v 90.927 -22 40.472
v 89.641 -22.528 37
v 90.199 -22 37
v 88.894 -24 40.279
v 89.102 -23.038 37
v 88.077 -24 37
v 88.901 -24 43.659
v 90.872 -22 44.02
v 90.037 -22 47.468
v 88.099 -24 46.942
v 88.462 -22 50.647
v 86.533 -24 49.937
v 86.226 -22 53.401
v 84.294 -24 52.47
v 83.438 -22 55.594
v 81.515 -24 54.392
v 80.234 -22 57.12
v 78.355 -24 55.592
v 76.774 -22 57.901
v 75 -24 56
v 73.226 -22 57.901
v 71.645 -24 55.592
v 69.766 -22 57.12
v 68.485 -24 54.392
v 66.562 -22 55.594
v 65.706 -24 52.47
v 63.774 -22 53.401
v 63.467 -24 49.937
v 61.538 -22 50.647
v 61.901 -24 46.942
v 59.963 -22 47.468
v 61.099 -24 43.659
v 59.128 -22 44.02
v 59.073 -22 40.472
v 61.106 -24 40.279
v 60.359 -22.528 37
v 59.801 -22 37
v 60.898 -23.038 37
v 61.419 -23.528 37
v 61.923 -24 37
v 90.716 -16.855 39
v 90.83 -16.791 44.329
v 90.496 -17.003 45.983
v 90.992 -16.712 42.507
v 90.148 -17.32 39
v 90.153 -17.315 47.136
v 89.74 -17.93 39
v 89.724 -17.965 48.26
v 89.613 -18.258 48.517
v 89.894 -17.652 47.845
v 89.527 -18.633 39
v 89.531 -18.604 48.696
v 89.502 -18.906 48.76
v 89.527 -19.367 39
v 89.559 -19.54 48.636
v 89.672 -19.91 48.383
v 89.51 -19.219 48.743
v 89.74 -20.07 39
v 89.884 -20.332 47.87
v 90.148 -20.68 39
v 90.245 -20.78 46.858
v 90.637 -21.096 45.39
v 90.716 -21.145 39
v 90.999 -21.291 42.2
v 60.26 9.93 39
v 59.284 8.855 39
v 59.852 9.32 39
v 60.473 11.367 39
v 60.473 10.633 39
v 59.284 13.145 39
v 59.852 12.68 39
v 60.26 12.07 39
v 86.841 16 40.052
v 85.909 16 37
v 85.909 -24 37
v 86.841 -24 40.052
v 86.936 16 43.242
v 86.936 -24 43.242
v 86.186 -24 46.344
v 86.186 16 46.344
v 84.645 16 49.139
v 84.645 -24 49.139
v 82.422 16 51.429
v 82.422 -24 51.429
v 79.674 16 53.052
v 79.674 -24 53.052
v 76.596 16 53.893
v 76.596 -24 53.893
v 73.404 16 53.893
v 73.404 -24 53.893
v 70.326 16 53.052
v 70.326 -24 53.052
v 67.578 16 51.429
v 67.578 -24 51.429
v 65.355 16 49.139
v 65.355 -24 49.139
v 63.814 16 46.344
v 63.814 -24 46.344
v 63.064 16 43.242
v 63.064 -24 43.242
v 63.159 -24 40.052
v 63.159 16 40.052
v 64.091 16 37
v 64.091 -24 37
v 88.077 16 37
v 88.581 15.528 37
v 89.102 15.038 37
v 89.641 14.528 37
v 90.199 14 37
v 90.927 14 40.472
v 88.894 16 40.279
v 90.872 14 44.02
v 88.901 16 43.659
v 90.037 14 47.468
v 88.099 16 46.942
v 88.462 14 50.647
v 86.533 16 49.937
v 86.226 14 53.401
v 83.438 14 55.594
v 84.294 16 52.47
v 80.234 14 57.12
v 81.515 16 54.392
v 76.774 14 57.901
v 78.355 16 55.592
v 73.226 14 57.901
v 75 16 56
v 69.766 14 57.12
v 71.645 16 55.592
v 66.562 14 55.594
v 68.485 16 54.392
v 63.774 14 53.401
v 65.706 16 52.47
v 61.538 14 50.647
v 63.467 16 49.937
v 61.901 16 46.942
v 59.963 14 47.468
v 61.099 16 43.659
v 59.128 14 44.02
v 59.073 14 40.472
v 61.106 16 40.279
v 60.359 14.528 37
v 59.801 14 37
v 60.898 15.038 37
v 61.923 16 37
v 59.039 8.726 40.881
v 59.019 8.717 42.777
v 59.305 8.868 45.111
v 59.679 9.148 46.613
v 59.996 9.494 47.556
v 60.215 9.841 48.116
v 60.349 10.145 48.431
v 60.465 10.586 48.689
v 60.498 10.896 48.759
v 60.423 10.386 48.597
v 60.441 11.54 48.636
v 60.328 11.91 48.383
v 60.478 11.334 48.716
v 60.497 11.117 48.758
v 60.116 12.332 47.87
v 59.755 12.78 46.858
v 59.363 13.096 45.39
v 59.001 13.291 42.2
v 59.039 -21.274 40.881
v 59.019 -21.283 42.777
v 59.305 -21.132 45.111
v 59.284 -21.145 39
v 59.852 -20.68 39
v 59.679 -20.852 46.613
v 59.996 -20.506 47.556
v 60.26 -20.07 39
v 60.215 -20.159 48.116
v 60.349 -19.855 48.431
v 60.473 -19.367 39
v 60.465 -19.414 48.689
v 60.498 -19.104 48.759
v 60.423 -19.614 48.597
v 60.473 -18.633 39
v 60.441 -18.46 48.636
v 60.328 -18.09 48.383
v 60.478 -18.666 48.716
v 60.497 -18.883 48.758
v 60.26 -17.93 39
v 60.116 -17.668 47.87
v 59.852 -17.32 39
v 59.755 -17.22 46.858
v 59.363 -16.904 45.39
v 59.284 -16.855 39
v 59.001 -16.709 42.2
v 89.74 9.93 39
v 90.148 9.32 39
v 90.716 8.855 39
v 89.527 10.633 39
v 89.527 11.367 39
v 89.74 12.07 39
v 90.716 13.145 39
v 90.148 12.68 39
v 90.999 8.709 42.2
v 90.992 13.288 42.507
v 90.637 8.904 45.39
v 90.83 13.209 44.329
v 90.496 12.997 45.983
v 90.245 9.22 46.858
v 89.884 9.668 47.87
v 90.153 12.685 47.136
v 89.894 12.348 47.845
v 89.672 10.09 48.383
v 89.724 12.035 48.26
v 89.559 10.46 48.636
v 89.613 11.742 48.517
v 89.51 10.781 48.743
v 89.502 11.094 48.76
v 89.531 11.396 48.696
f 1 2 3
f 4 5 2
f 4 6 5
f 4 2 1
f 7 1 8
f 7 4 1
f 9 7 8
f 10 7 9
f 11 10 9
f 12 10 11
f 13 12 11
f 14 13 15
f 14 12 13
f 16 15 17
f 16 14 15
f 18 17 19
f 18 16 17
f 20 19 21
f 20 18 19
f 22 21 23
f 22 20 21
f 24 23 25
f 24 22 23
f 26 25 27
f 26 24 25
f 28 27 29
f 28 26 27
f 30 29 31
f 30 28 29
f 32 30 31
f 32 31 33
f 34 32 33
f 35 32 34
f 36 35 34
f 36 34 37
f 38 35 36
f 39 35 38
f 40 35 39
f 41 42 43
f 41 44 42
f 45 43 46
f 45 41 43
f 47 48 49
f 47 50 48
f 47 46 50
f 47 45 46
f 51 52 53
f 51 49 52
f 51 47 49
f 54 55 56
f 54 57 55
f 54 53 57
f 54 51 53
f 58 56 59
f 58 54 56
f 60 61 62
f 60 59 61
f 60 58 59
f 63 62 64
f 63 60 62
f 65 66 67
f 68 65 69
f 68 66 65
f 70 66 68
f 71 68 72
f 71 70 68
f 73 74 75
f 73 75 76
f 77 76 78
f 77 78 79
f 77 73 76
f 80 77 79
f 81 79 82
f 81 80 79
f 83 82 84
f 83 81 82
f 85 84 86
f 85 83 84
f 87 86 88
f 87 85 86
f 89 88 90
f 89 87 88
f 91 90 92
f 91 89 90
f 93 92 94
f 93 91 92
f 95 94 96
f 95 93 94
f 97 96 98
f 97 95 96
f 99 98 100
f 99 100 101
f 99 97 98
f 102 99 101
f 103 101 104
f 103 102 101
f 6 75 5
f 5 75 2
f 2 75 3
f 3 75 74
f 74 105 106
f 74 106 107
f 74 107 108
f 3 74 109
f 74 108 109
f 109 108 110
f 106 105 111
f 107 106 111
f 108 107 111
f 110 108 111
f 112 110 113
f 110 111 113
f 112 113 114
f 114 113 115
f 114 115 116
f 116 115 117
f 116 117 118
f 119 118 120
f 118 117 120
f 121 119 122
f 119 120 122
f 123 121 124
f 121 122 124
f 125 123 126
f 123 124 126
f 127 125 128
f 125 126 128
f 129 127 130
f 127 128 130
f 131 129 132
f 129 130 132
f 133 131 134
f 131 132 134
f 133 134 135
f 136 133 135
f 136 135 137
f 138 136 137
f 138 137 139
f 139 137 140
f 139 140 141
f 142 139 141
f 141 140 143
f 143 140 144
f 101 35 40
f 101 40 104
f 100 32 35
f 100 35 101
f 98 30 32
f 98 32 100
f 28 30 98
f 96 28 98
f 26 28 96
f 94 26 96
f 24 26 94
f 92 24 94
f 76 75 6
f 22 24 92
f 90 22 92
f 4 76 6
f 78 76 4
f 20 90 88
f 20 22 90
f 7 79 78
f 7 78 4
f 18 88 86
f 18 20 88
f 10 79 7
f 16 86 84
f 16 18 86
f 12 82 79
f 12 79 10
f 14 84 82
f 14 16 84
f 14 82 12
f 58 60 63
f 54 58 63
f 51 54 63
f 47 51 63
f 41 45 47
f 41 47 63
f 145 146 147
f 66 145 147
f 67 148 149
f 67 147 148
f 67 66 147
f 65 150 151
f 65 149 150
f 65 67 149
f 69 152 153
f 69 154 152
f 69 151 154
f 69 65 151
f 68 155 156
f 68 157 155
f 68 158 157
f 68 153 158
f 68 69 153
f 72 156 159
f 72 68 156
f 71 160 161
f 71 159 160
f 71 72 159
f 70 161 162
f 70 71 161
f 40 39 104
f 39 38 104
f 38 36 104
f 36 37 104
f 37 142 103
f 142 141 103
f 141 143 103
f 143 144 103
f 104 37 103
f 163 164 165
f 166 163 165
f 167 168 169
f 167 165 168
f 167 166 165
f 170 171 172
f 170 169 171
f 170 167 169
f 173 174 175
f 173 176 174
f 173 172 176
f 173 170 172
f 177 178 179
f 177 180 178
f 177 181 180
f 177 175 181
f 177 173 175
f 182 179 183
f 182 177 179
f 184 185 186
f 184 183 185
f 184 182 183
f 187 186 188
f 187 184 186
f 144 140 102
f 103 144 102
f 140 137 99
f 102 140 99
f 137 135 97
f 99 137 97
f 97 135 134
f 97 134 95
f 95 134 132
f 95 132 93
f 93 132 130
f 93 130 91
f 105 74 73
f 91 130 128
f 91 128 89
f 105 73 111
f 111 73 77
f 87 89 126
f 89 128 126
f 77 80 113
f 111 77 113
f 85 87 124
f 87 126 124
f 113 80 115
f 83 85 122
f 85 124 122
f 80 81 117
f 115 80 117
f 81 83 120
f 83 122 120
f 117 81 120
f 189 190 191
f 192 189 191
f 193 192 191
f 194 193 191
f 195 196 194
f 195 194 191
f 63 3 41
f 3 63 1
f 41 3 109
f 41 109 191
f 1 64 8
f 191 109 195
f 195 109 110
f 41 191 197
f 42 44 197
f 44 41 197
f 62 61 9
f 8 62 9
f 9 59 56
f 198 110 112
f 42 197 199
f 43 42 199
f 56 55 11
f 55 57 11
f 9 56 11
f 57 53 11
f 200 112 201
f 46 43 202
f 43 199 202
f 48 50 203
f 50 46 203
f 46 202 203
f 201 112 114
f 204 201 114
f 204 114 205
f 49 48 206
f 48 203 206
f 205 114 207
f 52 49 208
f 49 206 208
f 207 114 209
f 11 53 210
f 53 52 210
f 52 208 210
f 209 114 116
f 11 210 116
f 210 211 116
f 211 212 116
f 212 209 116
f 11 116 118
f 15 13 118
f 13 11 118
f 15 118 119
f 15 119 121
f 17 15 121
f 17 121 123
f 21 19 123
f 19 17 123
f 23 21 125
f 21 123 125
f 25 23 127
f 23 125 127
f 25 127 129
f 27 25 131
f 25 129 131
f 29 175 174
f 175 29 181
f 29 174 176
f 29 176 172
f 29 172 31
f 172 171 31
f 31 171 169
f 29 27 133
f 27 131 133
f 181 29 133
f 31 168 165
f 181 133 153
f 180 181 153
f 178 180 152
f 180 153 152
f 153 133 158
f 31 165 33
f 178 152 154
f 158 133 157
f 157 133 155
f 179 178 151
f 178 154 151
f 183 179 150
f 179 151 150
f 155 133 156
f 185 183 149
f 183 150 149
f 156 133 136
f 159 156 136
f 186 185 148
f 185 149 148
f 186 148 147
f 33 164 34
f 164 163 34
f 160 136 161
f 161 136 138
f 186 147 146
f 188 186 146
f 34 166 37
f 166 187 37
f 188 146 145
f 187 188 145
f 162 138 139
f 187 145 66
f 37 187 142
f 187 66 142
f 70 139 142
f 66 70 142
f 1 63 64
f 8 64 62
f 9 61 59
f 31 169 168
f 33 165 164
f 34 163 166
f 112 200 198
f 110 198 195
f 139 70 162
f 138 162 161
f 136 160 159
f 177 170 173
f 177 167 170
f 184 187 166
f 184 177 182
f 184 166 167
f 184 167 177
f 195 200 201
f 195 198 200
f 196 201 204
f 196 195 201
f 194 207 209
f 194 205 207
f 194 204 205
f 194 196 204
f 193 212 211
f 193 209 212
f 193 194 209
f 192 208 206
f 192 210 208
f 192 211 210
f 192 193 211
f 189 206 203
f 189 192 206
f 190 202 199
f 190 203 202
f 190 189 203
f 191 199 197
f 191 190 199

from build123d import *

# Parameters (mm, degrees)
CYLINDER1807_R     = 2.5
CYLINDER1807_DEPTH = 30
CYLINDER1806_R     = 2.5
CYLINDER1806_DEPTH = 30
CYLINDER1808_R     = 2.5
CYLINDER1808_DEPTH = 30
CYLINDER1809_R     = 2.5
CYLINDER1809_DEPTH = 30
BOX716_W           = 100
BOX716_H           = 100
BOX716_DEPTH       = 100
TUBE090_R          = 16
TUBE090_R_2        = 12
TUBE090_DEPTH      = 40
CHAMFER057_SIZE    = 2


with BuildPart() as v_lec1807:
    # Cylinder1807 → Cylinder1807 (new body)
    with BuildSketch(Plane(origin=(58, -19, 26), x_dir=(1, 0, 0), z_dir=(0, 0, 1))):
        Circle(CYLINDER1807_R)
    extrude(amount=CYLINDER1807_DEPTH)


with BuildPart() as compound914:
    # Cylinder1806 → Cylinder1806 (new body)
    with BuildSketch(Plane(origin=(58, 11, 26), x_dir=(1, 0, 0), z_dir=(0, 0, 1))):
        Circle(CYLINDER1806_R)
    extrude(amount=CYLINDER1806_DEPTH)

    # Compound914: union Válec1807
    add(v_lec1807.part)


with BuildPart() as compound914_1:
    # Compound914 placement: moved
    add(compound914.part.moved(Location((34, 0, 13))))


with BuildPart() as v_lec1808:
    # Cylinder1808 → Cylinder1808 (new body)
    with BuildSketch(Plane(origin=(58, -19, 26), x_dir=(1, 0, 0), z_dir=(0, 0, 1))):
        Circle(CYLINDER1808_R)
    extrude(amount=CYLINDER1808_DEPTH)


with BuildPart() as compound915:
    # Cylinder1809 → Cylinder1809 (new body)
    with BuildSketch(Plane(origin=(58, 11, 26), x_dir=(1, 0, 0), z_dir=(0, 0, 1))):
        Circle(CYLINDER1809_R)
    extrude(amount=CYLINDER1809_DEPTH)

    # Compound916: union Válec1808
    add(v_lec1808.part)


with BuildPart() as compound915_1:
    # Compound916 placement: moved
    add(compound915.part.moved(Location((0, 0, 13))))

    # Compound915: union Compound914
    add(compound914_1.part)


with BuildPart() as krychle716:
    # Box716 → Box716 (new body)
    with BuildSketch(Plane(origin=(32, -54, -63), x_dir=(1, 0, 0), z_dir=(0, 0, 1))):
        with Locations((50, 50)):
            Rectangle(BOX716_W, BOX716_H)
    extrude(amount=BOX716_DEPTH)


with BuildPart() as cut541:
    # Tube090 → Tube090 (new body)
    with BuildSketch(Plane(origin=(75, 16, 42), x_dir=(1, 0, 0), z_dir=(0, -1, 0))):
        Circle(TUBE090_R)
        Circle(TUBE090_R_2, mode=Mode.SUBTRACT)
    extrude(amount=TUBE090_DEPTH)

    # Chamfer057
    chamfer057_edges = [cut541.edges().sort_by_distance(p)[0] for p in [
        (59, -24, 42),
        (59, 16, 42),
    ]]
    chamfer(chamfer057_edges, length=CHAMFER057_SIZE)

    # Cut533: cut Krychle716
    add(krychle716.part, mode=Mode.SUBTRACT)

    # Cut541: cut Compound915
    add(compound915_1.part, mode=Mode.SUBTRACT)


solid = cut541.part
